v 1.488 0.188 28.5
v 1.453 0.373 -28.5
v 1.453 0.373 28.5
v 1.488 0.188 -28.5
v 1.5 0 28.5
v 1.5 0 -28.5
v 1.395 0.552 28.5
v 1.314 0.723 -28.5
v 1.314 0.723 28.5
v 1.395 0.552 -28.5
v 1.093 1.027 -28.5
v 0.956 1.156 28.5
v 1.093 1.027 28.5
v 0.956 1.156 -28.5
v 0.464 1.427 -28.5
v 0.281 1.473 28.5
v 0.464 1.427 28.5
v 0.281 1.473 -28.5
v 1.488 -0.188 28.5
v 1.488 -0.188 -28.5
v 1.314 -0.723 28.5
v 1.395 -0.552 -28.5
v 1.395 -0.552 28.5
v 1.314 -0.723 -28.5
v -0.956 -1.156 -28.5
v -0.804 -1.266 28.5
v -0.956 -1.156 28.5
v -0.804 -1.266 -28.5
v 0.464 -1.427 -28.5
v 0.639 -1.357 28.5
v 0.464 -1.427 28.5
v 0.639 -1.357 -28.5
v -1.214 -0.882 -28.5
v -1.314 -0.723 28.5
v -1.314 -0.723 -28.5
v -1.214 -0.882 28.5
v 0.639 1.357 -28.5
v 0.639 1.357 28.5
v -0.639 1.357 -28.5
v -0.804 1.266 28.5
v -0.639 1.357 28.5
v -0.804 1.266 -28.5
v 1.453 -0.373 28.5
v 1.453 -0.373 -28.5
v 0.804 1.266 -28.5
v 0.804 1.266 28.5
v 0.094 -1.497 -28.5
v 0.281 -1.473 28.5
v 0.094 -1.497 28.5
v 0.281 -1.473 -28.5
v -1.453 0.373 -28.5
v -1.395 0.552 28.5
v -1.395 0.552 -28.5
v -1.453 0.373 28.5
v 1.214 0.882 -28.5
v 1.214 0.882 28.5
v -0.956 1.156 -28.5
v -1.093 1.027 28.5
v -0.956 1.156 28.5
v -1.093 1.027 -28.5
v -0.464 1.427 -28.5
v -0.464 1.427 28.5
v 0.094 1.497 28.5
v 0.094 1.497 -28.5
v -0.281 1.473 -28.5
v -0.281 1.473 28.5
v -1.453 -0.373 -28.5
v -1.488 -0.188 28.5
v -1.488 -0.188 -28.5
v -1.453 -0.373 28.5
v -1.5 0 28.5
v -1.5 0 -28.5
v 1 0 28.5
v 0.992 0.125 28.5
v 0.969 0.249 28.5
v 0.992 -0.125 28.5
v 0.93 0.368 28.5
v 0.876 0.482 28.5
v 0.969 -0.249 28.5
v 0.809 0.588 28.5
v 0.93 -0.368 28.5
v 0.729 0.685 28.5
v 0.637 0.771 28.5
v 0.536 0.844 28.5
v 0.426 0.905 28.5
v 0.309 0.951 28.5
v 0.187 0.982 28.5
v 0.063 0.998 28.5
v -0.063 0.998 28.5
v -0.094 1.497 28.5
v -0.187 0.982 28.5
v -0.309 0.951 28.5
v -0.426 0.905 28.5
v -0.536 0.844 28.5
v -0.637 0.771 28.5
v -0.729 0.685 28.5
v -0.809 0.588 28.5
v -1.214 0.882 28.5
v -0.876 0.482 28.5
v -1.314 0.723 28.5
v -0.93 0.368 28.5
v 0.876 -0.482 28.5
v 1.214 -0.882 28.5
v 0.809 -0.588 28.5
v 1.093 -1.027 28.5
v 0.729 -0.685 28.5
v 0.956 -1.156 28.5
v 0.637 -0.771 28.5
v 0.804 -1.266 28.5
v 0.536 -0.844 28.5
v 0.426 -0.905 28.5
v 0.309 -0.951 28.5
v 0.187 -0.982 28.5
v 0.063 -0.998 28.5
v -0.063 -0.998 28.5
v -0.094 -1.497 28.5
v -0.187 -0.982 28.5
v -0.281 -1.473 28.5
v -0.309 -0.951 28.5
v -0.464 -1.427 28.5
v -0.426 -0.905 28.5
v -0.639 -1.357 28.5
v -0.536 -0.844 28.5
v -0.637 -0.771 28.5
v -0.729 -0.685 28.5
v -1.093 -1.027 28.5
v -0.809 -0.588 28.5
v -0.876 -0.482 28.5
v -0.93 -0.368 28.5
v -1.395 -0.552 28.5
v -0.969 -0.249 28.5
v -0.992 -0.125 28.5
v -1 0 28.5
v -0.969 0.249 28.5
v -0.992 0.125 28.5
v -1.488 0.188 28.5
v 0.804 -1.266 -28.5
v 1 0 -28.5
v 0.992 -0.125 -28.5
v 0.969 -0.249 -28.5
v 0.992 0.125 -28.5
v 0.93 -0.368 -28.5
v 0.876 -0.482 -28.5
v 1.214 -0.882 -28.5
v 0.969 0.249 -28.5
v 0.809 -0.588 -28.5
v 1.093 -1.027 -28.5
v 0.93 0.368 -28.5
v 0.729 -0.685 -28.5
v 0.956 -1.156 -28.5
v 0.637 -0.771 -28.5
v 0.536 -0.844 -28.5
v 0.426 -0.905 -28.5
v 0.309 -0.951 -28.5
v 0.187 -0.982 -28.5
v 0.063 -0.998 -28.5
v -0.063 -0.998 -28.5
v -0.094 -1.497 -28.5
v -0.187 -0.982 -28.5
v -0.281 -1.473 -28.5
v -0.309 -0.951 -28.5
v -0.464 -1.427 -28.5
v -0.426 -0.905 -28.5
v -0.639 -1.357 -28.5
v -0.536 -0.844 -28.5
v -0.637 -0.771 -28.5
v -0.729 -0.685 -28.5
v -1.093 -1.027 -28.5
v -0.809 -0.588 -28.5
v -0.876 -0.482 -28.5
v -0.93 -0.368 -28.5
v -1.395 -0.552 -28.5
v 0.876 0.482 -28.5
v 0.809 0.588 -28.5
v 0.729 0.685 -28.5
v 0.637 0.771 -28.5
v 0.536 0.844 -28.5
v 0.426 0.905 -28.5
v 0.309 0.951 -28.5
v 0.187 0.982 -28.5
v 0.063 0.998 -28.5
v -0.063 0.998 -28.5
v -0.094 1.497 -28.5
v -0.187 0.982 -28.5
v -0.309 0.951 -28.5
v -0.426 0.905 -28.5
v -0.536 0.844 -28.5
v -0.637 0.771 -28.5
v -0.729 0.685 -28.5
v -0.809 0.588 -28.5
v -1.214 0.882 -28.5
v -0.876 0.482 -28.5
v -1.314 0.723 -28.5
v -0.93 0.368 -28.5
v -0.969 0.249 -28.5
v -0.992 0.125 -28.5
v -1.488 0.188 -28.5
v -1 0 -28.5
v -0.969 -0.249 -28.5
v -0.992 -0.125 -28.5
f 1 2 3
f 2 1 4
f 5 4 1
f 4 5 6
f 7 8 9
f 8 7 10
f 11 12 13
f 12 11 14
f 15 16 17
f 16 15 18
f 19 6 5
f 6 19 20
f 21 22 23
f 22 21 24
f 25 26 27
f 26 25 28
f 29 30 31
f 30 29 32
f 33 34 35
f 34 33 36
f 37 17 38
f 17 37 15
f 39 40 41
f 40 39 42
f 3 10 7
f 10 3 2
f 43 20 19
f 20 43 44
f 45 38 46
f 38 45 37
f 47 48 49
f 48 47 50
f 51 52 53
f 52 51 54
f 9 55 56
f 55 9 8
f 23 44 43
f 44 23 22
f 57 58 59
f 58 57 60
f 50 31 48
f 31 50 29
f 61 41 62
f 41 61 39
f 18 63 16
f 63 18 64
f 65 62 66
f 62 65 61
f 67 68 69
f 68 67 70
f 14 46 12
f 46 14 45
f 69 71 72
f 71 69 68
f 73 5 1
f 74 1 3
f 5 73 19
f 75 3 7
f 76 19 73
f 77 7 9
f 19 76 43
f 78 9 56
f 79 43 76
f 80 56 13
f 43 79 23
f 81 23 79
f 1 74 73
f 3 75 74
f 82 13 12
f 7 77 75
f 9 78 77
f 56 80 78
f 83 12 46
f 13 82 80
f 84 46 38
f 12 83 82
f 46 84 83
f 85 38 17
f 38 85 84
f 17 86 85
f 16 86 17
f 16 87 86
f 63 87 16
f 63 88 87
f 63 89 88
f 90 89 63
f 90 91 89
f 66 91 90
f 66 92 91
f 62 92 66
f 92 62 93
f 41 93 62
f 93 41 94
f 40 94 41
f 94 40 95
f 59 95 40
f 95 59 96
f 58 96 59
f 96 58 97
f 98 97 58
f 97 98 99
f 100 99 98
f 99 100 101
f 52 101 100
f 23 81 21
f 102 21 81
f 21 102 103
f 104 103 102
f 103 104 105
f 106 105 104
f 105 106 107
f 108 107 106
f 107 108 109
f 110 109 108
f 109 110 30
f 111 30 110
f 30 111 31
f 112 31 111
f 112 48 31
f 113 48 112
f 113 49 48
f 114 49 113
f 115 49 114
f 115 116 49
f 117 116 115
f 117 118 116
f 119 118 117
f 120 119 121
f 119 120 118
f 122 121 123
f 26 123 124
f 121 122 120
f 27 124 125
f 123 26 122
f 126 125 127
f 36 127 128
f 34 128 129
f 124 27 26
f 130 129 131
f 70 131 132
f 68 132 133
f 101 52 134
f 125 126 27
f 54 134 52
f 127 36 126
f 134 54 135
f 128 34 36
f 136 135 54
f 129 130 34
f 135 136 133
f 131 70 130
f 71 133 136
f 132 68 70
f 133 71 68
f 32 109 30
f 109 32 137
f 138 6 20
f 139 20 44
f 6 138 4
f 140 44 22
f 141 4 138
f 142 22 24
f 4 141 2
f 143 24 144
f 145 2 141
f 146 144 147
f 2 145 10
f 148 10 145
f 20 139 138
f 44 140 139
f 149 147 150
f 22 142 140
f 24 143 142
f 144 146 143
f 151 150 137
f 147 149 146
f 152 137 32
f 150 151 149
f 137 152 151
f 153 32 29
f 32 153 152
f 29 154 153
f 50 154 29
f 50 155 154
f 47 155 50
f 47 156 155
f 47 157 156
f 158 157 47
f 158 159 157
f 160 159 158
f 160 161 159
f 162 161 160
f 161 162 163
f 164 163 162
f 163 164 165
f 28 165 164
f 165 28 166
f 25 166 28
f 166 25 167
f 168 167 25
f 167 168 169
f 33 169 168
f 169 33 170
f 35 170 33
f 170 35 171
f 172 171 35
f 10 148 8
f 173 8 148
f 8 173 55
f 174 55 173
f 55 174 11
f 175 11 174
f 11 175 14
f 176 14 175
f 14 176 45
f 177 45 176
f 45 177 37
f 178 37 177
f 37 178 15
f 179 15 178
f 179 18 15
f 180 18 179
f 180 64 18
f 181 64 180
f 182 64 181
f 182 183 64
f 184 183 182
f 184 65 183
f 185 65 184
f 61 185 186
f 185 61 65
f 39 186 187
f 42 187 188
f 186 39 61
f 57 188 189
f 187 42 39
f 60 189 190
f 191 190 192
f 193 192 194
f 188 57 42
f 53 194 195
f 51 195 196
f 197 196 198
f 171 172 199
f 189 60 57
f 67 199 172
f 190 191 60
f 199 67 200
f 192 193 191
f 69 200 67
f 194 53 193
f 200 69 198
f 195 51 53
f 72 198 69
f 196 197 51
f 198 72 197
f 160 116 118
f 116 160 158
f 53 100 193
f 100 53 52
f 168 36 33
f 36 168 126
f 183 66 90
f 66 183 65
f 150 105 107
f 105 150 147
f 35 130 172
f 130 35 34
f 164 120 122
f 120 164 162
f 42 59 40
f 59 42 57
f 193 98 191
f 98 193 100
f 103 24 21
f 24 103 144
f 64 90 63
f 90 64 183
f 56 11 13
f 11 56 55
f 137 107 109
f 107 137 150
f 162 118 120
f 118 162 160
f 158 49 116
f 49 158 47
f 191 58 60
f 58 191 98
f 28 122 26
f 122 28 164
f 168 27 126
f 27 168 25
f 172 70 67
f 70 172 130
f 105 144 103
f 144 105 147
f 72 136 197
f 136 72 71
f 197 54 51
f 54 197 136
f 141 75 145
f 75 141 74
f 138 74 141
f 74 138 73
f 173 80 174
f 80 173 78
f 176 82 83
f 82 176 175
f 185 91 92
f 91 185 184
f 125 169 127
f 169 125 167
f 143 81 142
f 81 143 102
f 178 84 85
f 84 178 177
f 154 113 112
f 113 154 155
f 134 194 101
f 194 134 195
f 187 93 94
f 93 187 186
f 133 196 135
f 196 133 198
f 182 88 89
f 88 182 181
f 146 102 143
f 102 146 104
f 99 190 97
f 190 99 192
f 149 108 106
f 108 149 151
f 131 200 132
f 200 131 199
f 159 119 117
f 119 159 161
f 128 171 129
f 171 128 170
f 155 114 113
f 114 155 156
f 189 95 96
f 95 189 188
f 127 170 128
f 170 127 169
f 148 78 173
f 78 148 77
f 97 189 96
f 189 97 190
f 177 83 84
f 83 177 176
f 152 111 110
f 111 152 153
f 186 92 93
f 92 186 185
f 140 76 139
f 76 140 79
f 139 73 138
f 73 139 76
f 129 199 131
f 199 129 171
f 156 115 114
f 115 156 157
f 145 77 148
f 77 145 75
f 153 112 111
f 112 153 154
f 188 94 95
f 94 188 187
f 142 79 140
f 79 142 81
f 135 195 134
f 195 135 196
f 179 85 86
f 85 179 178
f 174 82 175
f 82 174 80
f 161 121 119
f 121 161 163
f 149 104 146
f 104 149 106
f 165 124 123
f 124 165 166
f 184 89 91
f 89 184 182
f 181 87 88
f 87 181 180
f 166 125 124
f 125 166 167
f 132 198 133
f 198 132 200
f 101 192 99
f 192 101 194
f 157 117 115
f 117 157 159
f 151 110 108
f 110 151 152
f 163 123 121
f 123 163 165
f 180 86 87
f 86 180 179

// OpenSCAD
$fn = 50;


difference() {
	union() {
		translate(v = [0, 0, -28.5000000000]) {
			cylinder(h = 57, r = 1.5000000000);
		}
	}
	union() {
		translate(v = [0, 0, -100.0000000000]) {
			cylinder(h = 200, r = 1.0000000000);
		}
	}
}
